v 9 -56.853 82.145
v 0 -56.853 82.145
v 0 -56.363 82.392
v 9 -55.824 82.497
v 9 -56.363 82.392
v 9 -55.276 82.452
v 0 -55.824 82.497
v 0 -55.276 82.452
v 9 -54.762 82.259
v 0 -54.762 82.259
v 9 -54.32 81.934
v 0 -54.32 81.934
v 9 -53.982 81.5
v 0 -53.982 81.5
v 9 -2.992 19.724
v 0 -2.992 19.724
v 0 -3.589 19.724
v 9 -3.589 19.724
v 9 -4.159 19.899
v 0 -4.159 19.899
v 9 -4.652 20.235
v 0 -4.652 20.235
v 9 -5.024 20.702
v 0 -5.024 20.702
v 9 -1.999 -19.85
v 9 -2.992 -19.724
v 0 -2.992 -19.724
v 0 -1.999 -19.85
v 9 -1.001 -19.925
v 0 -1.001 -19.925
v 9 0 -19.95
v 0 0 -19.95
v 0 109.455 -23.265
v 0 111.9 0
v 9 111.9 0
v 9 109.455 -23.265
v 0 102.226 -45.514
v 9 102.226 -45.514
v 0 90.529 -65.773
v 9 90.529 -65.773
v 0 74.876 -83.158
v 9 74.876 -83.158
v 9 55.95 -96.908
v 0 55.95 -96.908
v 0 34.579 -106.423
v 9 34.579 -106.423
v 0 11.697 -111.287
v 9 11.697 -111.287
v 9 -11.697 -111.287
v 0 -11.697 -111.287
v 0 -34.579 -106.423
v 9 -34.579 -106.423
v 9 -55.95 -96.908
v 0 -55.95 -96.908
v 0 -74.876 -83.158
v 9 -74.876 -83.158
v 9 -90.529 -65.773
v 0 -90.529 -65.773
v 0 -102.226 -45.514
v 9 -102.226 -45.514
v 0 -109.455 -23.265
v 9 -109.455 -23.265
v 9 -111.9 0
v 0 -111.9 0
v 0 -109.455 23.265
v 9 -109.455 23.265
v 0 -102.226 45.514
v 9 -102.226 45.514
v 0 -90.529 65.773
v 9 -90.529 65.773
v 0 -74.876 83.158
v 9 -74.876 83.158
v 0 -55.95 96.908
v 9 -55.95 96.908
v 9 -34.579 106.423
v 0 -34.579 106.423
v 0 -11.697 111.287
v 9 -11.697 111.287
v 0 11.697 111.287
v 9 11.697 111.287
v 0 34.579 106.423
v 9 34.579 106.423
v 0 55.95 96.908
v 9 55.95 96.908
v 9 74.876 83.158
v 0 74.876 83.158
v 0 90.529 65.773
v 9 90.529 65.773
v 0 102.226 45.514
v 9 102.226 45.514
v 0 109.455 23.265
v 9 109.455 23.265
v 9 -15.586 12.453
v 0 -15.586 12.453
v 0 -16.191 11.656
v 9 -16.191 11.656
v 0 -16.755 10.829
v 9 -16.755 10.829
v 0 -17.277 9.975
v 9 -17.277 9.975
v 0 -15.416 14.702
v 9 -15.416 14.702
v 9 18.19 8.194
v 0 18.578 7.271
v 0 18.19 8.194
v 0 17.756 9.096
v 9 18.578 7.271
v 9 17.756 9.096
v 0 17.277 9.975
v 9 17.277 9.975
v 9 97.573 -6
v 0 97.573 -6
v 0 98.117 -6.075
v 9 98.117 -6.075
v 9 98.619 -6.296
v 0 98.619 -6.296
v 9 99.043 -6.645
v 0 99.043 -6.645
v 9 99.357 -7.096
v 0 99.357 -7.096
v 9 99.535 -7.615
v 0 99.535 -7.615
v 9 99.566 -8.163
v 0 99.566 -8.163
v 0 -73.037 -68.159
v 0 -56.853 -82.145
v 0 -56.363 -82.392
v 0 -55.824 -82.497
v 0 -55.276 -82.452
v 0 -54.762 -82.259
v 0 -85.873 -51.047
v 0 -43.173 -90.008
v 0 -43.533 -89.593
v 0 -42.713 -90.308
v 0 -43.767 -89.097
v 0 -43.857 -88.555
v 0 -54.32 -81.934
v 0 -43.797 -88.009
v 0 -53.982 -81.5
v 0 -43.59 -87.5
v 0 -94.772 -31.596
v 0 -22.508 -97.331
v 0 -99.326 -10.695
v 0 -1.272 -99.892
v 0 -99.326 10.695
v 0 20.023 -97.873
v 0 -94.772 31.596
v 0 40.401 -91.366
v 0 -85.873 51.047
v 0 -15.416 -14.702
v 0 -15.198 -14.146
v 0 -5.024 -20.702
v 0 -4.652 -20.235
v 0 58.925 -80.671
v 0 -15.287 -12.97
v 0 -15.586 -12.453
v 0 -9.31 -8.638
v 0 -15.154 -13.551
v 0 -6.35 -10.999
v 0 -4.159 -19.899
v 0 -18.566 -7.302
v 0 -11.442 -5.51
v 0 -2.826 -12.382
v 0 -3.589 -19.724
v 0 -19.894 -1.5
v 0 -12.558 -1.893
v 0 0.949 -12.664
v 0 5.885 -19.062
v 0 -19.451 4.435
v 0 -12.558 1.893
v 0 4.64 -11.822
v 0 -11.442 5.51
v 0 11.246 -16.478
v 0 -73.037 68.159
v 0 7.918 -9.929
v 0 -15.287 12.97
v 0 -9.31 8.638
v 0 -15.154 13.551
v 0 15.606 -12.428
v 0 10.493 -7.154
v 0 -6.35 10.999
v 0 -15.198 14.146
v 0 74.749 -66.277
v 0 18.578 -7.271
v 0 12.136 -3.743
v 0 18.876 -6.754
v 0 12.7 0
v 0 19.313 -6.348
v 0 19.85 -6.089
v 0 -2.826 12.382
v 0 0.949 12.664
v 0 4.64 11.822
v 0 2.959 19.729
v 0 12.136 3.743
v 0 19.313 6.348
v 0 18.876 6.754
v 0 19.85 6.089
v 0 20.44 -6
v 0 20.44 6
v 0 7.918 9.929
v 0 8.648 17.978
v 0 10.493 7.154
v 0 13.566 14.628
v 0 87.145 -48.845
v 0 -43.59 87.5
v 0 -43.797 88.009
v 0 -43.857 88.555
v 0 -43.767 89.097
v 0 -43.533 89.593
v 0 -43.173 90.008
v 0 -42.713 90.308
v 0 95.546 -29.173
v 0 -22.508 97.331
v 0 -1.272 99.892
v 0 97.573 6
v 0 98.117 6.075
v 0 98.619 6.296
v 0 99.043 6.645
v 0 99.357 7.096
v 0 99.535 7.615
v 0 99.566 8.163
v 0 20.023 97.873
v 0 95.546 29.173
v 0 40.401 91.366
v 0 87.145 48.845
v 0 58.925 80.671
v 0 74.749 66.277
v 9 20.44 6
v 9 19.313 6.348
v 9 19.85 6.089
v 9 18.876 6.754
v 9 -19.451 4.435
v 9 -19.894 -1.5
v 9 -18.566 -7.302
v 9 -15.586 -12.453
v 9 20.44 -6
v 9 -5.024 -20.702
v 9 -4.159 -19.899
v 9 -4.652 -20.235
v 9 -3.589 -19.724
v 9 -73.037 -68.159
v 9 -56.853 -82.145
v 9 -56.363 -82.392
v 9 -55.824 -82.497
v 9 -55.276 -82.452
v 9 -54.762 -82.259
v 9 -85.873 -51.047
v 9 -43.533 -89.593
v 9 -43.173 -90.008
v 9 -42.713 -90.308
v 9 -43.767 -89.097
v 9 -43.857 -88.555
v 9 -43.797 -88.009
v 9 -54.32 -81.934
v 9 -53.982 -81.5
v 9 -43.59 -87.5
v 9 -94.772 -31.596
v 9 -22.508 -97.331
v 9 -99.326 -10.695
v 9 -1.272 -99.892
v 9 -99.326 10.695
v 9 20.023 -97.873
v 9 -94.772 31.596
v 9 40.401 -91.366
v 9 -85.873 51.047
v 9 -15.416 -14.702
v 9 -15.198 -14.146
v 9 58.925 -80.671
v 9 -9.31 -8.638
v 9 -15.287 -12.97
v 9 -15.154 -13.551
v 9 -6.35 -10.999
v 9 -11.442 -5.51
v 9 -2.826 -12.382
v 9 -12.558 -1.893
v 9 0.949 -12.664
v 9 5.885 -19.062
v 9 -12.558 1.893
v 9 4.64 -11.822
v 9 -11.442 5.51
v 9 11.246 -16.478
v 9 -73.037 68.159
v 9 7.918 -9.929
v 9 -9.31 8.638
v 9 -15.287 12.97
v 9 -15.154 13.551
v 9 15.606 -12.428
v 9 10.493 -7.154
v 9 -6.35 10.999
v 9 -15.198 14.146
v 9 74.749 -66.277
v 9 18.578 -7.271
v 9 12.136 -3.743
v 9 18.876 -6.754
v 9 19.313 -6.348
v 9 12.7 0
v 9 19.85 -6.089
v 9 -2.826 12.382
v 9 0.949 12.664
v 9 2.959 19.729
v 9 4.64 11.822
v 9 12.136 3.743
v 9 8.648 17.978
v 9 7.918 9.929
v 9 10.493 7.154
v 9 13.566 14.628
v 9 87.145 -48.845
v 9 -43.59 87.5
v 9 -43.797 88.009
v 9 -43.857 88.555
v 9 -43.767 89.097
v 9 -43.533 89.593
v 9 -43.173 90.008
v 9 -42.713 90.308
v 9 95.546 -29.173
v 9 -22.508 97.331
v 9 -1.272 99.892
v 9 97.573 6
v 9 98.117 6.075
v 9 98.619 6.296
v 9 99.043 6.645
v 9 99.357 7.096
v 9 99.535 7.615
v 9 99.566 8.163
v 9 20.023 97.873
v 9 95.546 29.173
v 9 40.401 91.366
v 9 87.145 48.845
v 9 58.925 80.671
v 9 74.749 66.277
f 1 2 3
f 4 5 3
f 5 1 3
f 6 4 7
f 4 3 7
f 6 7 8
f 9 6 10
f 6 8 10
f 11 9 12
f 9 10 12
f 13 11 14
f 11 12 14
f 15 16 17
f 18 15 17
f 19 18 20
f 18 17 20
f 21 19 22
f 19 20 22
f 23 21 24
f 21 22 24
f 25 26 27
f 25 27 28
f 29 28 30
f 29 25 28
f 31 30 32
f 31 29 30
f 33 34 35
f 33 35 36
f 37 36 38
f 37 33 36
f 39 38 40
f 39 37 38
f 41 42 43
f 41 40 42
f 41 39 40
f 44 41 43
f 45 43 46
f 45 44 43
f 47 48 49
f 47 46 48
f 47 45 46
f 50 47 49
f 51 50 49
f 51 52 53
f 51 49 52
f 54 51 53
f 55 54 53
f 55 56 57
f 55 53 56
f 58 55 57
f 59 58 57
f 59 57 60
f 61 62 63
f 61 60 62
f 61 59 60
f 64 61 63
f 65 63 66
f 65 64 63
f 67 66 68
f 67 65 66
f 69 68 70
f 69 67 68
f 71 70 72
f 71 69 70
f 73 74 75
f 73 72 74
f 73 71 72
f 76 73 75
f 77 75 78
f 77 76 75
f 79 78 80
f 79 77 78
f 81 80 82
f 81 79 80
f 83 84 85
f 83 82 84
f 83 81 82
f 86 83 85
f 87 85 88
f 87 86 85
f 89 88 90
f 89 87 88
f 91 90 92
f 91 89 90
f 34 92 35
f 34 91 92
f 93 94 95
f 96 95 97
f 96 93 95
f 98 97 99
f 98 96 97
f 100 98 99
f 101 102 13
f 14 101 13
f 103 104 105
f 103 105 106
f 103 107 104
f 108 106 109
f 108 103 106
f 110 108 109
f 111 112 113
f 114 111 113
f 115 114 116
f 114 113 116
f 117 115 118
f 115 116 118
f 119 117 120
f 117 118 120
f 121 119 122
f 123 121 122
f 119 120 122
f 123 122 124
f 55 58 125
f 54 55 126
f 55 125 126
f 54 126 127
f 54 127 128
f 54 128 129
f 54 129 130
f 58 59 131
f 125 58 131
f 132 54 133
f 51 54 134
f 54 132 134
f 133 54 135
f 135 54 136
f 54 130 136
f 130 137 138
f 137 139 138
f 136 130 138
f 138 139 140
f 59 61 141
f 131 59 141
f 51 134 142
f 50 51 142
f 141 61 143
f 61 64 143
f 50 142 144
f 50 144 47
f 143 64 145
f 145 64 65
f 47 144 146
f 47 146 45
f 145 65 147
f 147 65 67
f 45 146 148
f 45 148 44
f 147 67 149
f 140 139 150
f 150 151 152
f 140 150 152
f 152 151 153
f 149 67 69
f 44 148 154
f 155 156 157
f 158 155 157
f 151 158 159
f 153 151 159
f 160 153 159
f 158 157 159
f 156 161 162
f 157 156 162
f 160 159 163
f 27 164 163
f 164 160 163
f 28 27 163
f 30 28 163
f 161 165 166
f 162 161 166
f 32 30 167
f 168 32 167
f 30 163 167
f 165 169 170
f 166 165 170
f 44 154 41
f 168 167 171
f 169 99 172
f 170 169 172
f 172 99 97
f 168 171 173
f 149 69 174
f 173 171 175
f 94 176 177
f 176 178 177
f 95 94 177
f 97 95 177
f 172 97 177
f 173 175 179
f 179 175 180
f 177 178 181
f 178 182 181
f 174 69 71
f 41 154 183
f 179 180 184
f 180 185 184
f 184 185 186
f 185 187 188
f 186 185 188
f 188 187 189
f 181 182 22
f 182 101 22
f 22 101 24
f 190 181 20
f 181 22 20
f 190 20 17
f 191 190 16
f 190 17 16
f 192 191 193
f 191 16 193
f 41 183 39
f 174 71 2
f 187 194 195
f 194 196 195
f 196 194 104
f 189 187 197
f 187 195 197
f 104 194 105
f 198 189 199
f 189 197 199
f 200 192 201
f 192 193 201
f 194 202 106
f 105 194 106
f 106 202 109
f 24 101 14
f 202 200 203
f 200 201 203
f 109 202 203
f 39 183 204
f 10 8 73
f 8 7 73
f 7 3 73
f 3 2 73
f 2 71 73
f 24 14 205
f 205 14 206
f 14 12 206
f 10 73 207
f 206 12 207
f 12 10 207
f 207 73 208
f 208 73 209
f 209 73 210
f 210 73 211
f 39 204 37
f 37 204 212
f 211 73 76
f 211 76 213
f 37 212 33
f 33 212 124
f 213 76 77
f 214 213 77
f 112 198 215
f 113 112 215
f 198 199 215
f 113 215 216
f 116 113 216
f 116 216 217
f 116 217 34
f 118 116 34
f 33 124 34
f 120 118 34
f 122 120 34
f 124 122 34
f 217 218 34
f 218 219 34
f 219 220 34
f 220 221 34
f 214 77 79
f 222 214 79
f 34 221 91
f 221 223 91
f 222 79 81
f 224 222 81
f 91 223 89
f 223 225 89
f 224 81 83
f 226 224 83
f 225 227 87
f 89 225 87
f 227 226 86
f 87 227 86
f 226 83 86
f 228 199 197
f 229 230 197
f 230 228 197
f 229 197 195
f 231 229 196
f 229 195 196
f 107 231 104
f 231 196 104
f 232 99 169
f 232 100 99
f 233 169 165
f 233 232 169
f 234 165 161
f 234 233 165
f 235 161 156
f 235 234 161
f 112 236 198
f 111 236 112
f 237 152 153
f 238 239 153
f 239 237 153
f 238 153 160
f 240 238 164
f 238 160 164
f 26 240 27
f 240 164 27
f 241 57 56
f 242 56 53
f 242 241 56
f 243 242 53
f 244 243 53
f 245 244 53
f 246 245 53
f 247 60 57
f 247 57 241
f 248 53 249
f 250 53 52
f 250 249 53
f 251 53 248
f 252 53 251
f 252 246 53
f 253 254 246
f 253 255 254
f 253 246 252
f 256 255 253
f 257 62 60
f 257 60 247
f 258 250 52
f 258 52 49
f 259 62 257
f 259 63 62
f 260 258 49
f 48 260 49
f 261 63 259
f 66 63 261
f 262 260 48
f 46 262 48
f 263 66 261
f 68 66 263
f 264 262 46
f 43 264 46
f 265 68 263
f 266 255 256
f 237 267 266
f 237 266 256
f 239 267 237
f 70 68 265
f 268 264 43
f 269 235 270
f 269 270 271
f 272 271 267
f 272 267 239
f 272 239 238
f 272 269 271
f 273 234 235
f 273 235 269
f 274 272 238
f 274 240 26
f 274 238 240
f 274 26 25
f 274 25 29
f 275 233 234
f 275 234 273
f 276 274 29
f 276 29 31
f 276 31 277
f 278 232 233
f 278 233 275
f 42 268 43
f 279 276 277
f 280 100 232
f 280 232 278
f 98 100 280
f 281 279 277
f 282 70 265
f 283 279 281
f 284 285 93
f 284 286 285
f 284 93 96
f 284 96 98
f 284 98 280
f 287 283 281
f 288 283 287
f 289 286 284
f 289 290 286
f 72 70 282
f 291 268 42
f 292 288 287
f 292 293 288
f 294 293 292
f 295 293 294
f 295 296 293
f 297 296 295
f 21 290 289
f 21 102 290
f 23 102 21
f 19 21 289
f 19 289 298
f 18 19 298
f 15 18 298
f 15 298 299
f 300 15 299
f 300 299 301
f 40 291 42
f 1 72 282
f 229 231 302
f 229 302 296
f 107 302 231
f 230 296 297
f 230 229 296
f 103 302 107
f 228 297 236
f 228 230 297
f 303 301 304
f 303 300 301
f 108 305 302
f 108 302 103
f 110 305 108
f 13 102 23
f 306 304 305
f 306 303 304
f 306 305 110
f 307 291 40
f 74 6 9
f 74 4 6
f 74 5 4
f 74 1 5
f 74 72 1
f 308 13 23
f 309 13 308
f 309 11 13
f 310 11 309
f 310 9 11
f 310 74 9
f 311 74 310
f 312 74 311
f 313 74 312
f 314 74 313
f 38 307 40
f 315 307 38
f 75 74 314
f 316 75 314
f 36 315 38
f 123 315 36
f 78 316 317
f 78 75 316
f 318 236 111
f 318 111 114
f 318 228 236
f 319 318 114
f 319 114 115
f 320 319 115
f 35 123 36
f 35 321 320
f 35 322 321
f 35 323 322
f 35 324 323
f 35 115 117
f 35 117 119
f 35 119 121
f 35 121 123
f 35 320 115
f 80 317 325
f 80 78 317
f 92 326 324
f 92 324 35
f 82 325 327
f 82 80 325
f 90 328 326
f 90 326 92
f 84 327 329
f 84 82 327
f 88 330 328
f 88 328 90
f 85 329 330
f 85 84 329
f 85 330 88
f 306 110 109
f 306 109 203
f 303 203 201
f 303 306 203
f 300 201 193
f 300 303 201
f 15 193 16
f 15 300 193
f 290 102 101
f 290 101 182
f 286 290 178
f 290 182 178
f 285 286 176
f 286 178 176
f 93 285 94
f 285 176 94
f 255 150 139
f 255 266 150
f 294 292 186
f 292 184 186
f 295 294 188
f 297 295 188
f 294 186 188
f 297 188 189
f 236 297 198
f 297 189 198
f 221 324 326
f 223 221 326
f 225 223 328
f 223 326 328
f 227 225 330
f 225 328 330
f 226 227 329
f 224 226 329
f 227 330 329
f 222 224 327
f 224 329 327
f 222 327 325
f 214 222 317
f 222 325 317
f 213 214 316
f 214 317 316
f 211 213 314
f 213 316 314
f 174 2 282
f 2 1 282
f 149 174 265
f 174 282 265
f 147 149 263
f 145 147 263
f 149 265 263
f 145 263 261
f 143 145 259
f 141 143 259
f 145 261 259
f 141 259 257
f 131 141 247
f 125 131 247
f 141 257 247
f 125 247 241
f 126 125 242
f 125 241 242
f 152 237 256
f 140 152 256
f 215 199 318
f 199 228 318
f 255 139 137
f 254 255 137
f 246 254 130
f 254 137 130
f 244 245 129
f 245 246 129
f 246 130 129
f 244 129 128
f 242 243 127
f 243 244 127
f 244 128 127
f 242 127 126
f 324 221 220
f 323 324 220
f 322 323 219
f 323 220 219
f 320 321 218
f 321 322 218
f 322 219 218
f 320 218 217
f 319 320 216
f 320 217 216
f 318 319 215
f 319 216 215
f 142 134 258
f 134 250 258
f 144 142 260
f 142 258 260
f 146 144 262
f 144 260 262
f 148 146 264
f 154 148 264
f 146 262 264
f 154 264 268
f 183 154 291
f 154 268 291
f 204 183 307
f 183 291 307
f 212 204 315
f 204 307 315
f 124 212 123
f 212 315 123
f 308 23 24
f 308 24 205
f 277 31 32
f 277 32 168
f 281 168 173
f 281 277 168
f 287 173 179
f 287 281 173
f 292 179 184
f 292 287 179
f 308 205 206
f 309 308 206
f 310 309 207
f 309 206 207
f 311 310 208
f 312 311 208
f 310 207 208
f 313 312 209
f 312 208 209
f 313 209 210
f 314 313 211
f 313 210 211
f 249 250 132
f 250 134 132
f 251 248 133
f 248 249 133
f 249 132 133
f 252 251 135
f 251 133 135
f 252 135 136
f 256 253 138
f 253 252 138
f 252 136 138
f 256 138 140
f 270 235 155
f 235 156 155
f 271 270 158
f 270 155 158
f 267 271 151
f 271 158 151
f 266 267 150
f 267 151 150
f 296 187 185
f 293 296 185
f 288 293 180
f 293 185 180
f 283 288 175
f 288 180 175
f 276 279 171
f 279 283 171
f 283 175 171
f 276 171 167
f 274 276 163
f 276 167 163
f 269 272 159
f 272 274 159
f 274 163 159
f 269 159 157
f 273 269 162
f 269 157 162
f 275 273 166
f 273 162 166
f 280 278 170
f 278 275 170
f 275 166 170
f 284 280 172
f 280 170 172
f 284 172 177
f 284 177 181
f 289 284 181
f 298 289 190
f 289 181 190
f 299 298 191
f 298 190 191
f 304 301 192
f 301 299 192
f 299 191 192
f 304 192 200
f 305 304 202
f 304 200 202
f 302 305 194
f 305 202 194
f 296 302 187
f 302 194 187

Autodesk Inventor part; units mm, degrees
ref_plane "YZ Plane" through (0, 0, 0) normal (1, 0, 0) x (0, 1, 0)
ref_plane "XZ Plane" through (0, 0, 0) normal (0, 1, 0) x (-1, 0, 0)
ref_plane "XY Plane" through (0, 0, 0) normal (0, 0, 1) x (1, 0, 0)
sketch "Sketch1" plane through (0, 0, 0) normal (1, 0, 0) x (0, 1, 0)
  circle A0 centre (0, 0) radius 12.7
  circle A1 centre (0, 0) radius 111.9
  dimension "D_eje" = 25.4
  dimension "d1" = 223.8
extrude "Extrusion1" add sketch "Sketch1" along normal blind 9
sketch "Sketch2" plane through (9, 0, 0) normal (1, 0, 0) x (0, 0, -1)
  line L0 (6, 19.0264) -> (6, 99.7197)
  line L1 (0, -188.1875) -> (0, 173.8632) construction
  arc A0 (0, 19.95) -> (-13.4773, 14.7093) centre (0, 0) ccw construction
  circle A1 centre (0, 0) radius 12.7 construction
  arc A2 (0, 99.9) -> (86.5159, -49.95) centre (0, 0) ccw construction
  line L2 (181.1282, 0) -> (-189.3983, 0) construction
  arc A3 (6, 19.0264) -> (0, 19.95) centre (0, 0) ccw construction
  arc A4 (-19.95, 0) -> (0, -19.95) centre (0, 0) ccw construction
  arc A5 (0, -19.95) -> (17.2772, -9.975) centre (0, 0) ccw construction
  arc A6 (19.95, 0) -> (6, 19.0264) centre (0, 0) ccw
  line L3 (0, 0) -> (86.5159, -49.95) construction
  line L4 (19.4773, -4.317) -> (89.3598, -44.6637)
  arc A7 (-13.4773, 14.7093) -> (-19.95, 0) centre (0, 0) ccw construction
  arc A8 (19.4773, -4.317) -> (19.95, 0) centre (0, 0) ccw
  arc A9 (17.2772, -9.975) -> (19.4773, -4.317) centre (0, 0) ccw construction
  arc A10 (6, 99.7197) -> (0, 99.9) centre (0, 0) ccw construction
  arc A11 (86.5159, -49.95) -> (89.3598, -44.6637) centre (0, 0) ccw construction
  arc A12 (89.3598, -44.6637) -> (6, 99.7197) centre (0, 0) ccw
  line L5 (-19.4773, -4.317) -> (-89.3598, -44.6637)
  arc A13 (-6, 99.7197) -> (-89.3598, -44.6637) centre (0, 0) ccw
  line L6 (-6, 19.0264) -> (-6, 99.7197)
  arc A14 (-9.975, 17.2772) -> (-19.4773, -4.317) centre (0, 0) ccw
  line L7 (13.4773, -14.7093) -> (83.3598, -55.056)
  arc A15 (-83.3598, -55.056) -> (83.3598, -55.056) centre (0, 0) ccw
  line L8 (-13.4773, -14.7093) -> (-83.3598, -55.056)
  arc A16 (-9.975, -17.2772) -> (13.4773, -14.7093) centre (0, 0) ccw
  point P0 (-6, -19.0264)
  point P1 (19.4773, 4.317)
  dimension "d4" = 6
  dimension "d7" = 39.9
  dimension "d8" = 199.8
  dimension "d10" = 120
  dimension "d11" = 6
  dimension "d14" = 360
extrude "Extrusion2" cut sketch "Sketch2" against normal blind 9
pattern_circular "Circular Pattern1" count 3 over 360 about axis through (-10, 0, 0) along (1, 0, 0) of "Extrusion2"
fillet "Fillet1" radius 2 12 edges at (4.5, -14.7093, -13.4773) (4.5, -14.7093, 13.4773) (4.5, -55.056, 83.3598) (4.5, -55.056, -83.3598) (4.5, -44.6637, -89.3598) (4.5, 99.7197, -6) (4.5, -4.317, -19.4773) (4.5, 19.0264, -6) (4.5, 19.0264, 6) (4.5, -4.317, 19.4773) (4.5, 99.7197, 6) (4.5, -44.6637, 89.3598)
properties part number "Rueda_triciclo" material "Aluminum 6061"
